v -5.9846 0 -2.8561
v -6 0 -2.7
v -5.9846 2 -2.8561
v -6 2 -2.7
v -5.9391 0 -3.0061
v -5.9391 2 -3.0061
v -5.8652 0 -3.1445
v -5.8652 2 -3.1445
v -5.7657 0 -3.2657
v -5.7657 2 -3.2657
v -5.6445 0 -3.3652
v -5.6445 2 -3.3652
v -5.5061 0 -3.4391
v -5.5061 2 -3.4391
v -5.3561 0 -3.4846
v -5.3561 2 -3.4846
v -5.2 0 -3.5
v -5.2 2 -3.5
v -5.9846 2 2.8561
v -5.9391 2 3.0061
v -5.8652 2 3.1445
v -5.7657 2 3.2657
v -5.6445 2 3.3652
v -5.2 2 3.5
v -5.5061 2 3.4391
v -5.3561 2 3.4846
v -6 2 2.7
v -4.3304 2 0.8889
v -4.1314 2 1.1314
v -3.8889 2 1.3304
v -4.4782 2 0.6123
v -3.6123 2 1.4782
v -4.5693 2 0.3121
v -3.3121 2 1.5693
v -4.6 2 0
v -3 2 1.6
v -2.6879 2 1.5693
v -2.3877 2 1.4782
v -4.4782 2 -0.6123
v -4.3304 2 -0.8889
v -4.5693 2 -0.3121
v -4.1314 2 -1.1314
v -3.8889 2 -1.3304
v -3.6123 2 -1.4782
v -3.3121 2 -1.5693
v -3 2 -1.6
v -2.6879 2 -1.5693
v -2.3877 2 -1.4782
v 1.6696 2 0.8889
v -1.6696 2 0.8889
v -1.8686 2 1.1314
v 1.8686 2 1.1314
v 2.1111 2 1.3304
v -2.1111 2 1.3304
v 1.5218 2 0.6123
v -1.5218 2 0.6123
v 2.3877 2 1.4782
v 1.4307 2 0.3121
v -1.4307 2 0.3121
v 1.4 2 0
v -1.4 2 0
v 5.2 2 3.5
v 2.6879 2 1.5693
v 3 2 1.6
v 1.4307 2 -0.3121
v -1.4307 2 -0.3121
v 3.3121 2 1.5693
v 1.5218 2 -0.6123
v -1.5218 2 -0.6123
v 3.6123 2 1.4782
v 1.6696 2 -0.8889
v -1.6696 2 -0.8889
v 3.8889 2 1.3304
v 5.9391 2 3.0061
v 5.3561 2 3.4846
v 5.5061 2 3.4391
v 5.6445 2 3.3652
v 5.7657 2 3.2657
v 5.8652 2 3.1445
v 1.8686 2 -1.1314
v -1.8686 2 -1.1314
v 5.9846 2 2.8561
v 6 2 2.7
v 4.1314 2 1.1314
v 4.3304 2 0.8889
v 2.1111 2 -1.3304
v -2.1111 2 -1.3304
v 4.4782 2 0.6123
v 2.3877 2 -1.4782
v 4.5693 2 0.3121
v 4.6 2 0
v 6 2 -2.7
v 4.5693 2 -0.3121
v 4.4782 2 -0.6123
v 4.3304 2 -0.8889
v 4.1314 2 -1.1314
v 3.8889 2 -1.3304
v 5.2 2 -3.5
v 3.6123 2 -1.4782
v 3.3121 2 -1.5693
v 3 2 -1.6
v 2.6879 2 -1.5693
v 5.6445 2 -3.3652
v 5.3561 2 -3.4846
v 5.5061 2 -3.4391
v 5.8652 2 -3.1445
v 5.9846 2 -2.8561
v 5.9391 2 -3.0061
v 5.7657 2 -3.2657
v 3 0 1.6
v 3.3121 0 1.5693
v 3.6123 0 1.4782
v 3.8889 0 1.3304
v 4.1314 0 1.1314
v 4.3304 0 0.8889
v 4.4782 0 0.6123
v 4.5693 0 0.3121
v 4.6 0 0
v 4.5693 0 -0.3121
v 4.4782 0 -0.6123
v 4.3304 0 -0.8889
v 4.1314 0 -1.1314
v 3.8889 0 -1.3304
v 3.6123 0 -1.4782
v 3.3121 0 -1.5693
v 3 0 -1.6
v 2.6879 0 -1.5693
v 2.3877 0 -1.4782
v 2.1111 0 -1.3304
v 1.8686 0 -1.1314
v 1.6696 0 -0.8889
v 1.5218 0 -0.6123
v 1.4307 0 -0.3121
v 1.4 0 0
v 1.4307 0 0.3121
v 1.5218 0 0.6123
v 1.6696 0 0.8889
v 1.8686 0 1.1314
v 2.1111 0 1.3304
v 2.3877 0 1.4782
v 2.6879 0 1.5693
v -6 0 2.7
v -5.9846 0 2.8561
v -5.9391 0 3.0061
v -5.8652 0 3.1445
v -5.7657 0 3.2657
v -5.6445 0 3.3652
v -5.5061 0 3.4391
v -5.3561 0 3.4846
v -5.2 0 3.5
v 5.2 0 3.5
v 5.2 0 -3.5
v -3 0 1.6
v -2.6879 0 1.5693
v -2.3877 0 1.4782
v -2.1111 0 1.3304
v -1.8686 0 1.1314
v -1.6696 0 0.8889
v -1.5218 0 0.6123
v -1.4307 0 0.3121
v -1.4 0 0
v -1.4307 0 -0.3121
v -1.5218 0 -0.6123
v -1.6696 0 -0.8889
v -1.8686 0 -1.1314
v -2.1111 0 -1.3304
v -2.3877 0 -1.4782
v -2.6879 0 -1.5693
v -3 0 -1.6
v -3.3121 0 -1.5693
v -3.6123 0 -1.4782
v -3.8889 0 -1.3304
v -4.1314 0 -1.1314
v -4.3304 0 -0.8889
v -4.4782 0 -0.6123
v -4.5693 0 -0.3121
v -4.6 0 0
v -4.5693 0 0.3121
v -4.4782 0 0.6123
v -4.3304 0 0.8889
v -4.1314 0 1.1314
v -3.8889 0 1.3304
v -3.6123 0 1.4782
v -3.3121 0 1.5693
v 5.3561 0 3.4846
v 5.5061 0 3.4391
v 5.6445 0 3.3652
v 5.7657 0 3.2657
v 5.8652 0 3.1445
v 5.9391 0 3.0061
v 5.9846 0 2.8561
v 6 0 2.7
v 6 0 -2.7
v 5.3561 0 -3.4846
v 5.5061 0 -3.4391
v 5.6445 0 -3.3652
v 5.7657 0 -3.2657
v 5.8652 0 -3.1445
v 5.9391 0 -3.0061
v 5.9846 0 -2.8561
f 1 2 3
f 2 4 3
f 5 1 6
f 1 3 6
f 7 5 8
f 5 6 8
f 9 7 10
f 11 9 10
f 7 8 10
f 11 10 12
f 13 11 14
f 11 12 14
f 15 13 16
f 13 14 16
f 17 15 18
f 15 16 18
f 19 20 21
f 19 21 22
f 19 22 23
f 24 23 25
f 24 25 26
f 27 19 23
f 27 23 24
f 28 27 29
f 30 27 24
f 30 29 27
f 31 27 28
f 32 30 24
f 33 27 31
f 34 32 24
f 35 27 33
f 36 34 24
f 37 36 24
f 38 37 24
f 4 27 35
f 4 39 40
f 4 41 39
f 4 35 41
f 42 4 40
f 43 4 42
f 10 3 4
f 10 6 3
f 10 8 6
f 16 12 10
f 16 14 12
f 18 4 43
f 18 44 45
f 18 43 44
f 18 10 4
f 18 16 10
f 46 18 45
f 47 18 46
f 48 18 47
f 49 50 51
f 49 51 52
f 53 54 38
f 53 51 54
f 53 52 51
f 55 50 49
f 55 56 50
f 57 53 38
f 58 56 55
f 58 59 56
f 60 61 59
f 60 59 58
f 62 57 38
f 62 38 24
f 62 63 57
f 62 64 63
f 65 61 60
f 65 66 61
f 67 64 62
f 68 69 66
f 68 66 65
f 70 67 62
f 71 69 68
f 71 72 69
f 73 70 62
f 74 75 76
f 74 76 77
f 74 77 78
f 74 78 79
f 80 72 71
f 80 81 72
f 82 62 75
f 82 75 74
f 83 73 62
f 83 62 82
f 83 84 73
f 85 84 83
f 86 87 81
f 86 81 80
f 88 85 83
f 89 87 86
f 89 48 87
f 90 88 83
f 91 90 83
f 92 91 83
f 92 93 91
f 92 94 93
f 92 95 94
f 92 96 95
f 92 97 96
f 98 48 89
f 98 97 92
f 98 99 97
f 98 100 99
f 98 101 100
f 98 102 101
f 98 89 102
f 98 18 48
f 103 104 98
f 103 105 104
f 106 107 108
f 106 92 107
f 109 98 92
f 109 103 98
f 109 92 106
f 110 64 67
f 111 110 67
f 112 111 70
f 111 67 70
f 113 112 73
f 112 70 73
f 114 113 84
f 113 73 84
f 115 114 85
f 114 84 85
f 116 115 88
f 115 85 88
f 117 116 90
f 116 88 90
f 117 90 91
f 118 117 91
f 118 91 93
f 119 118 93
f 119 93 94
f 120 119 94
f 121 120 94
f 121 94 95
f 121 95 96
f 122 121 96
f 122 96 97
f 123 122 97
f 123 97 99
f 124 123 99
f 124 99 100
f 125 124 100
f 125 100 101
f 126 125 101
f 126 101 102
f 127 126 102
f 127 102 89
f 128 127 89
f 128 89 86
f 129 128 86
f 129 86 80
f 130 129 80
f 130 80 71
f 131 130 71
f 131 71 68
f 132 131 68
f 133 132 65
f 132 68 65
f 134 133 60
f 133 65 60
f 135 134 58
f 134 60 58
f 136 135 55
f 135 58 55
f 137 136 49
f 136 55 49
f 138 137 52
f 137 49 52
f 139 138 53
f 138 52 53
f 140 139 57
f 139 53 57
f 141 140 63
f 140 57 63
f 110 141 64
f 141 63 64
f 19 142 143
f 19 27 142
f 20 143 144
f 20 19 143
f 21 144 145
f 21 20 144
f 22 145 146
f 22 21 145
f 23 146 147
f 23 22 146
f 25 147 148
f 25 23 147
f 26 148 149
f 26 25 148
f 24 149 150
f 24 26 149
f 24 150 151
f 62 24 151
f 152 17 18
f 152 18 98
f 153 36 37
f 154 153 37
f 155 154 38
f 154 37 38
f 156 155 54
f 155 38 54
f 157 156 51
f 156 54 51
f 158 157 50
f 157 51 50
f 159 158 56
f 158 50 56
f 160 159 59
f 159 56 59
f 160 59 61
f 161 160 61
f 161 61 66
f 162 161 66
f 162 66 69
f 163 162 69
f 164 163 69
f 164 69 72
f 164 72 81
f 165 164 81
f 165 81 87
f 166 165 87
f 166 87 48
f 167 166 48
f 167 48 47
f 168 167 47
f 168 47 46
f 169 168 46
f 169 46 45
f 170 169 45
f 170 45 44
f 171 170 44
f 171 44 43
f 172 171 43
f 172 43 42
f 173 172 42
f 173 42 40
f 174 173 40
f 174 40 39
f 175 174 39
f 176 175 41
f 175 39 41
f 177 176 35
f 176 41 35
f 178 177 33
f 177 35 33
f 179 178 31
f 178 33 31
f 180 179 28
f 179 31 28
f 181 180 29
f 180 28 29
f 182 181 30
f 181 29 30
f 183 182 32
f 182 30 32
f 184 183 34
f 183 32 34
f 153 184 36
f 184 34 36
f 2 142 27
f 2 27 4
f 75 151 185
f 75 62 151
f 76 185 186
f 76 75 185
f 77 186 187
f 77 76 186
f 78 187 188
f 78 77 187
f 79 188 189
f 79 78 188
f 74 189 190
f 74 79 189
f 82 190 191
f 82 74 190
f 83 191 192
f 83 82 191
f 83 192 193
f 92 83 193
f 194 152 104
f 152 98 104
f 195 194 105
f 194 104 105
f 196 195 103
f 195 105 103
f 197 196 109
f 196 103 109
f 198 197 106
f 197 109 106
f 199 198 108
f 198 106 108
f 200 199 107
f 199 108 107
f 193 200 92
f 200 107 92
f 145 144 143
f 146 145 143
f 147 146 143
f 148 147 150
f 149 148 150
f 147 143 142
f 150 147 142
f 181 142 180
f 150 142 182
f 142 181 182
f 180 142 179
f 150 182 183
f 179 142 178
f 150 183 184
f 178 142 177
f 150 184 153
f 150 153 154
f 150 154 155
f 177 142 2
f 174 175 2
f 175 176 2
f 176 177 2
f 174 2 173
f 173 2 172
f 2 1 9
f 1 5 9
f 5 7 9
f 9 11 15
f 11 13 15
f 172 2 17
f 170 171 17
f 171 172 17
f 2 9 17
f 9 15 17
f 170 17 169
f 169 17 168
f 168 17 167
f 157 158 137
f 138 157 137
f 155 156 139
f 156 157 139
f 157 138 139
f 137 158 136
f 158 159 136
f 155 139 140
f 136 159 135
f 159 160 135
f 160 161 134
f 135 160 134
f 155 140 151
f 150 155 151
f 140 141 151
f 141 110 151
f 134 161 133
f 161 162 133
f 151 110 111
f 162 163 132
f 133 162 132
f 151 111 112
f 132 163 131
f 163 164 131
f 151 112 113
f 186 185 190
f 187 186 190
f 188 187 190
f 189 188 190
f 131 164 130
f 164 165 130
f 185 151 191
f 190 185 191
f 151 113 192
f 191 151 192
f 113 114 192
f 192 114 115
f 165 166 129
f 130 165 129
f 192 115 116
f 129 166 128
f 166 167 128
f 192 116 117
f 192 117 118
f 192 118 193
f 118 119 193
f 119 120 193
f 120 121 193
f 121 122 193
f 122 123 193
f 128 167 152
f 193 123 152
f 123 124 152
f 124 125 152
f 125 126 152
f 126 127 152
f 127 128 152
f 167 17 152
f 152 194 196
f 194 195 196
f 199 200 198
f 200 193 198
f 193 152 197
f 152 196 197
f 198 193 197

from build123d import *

# Parameters (mm, degrees)
SKETCH1_W           = 12
SKETCH1_H           = 7
BOSS_EXTRUDE1_DEPTH = 2
SKETCH2_R           = 1.6
CUT_EXTRUDE1_DEPTH  = 8.228416147
FILLET1_R           = 0.8


with BuildPart() as part:
    # Sketch1 → Boss-Extrude1 (new body)
    with BuildSketch(Plane(origin=(0, 0, 0), x_dir=(1, 0, 0), z_dir=(0, 1, 0))):
        Rectangle(SKETCH1_W, SKETCH1_H)
    extrude(amount=BOSS_EXTRUDE1_DEPTH)

    # Sketch2 → Cut-Extrude1 (cut, through all)
    with BuildSketch(Plane(origin=(0, 2, 0), x_dir=(1, 0, 0), z_dir=(0, 1, 0))):
        with Locations(Location((-3, 0, 0), (0, 0, 270))):
            Circle(SKETCH2_R)
        with Locations(Location((3, 0, 0), (0, 0, 270))):
            Circle(SKETCH2_R)
    extrude(amount=-CUT_EXTRUDE1_DEPTH, mode=Mode.SUBTRACT)

    # Fillet1
    fillet1_edges = [part.edges().sort_by_distance(p)[0] for p in [
        (6, 1, 3.5),
        (-6, 1, 3.5),
        (-6, 1, -3.5),
        (6, 1, -3.5),
    ]]
    fillet(fillet1_edges, radius=FILLET1_R)


solid = part.part
